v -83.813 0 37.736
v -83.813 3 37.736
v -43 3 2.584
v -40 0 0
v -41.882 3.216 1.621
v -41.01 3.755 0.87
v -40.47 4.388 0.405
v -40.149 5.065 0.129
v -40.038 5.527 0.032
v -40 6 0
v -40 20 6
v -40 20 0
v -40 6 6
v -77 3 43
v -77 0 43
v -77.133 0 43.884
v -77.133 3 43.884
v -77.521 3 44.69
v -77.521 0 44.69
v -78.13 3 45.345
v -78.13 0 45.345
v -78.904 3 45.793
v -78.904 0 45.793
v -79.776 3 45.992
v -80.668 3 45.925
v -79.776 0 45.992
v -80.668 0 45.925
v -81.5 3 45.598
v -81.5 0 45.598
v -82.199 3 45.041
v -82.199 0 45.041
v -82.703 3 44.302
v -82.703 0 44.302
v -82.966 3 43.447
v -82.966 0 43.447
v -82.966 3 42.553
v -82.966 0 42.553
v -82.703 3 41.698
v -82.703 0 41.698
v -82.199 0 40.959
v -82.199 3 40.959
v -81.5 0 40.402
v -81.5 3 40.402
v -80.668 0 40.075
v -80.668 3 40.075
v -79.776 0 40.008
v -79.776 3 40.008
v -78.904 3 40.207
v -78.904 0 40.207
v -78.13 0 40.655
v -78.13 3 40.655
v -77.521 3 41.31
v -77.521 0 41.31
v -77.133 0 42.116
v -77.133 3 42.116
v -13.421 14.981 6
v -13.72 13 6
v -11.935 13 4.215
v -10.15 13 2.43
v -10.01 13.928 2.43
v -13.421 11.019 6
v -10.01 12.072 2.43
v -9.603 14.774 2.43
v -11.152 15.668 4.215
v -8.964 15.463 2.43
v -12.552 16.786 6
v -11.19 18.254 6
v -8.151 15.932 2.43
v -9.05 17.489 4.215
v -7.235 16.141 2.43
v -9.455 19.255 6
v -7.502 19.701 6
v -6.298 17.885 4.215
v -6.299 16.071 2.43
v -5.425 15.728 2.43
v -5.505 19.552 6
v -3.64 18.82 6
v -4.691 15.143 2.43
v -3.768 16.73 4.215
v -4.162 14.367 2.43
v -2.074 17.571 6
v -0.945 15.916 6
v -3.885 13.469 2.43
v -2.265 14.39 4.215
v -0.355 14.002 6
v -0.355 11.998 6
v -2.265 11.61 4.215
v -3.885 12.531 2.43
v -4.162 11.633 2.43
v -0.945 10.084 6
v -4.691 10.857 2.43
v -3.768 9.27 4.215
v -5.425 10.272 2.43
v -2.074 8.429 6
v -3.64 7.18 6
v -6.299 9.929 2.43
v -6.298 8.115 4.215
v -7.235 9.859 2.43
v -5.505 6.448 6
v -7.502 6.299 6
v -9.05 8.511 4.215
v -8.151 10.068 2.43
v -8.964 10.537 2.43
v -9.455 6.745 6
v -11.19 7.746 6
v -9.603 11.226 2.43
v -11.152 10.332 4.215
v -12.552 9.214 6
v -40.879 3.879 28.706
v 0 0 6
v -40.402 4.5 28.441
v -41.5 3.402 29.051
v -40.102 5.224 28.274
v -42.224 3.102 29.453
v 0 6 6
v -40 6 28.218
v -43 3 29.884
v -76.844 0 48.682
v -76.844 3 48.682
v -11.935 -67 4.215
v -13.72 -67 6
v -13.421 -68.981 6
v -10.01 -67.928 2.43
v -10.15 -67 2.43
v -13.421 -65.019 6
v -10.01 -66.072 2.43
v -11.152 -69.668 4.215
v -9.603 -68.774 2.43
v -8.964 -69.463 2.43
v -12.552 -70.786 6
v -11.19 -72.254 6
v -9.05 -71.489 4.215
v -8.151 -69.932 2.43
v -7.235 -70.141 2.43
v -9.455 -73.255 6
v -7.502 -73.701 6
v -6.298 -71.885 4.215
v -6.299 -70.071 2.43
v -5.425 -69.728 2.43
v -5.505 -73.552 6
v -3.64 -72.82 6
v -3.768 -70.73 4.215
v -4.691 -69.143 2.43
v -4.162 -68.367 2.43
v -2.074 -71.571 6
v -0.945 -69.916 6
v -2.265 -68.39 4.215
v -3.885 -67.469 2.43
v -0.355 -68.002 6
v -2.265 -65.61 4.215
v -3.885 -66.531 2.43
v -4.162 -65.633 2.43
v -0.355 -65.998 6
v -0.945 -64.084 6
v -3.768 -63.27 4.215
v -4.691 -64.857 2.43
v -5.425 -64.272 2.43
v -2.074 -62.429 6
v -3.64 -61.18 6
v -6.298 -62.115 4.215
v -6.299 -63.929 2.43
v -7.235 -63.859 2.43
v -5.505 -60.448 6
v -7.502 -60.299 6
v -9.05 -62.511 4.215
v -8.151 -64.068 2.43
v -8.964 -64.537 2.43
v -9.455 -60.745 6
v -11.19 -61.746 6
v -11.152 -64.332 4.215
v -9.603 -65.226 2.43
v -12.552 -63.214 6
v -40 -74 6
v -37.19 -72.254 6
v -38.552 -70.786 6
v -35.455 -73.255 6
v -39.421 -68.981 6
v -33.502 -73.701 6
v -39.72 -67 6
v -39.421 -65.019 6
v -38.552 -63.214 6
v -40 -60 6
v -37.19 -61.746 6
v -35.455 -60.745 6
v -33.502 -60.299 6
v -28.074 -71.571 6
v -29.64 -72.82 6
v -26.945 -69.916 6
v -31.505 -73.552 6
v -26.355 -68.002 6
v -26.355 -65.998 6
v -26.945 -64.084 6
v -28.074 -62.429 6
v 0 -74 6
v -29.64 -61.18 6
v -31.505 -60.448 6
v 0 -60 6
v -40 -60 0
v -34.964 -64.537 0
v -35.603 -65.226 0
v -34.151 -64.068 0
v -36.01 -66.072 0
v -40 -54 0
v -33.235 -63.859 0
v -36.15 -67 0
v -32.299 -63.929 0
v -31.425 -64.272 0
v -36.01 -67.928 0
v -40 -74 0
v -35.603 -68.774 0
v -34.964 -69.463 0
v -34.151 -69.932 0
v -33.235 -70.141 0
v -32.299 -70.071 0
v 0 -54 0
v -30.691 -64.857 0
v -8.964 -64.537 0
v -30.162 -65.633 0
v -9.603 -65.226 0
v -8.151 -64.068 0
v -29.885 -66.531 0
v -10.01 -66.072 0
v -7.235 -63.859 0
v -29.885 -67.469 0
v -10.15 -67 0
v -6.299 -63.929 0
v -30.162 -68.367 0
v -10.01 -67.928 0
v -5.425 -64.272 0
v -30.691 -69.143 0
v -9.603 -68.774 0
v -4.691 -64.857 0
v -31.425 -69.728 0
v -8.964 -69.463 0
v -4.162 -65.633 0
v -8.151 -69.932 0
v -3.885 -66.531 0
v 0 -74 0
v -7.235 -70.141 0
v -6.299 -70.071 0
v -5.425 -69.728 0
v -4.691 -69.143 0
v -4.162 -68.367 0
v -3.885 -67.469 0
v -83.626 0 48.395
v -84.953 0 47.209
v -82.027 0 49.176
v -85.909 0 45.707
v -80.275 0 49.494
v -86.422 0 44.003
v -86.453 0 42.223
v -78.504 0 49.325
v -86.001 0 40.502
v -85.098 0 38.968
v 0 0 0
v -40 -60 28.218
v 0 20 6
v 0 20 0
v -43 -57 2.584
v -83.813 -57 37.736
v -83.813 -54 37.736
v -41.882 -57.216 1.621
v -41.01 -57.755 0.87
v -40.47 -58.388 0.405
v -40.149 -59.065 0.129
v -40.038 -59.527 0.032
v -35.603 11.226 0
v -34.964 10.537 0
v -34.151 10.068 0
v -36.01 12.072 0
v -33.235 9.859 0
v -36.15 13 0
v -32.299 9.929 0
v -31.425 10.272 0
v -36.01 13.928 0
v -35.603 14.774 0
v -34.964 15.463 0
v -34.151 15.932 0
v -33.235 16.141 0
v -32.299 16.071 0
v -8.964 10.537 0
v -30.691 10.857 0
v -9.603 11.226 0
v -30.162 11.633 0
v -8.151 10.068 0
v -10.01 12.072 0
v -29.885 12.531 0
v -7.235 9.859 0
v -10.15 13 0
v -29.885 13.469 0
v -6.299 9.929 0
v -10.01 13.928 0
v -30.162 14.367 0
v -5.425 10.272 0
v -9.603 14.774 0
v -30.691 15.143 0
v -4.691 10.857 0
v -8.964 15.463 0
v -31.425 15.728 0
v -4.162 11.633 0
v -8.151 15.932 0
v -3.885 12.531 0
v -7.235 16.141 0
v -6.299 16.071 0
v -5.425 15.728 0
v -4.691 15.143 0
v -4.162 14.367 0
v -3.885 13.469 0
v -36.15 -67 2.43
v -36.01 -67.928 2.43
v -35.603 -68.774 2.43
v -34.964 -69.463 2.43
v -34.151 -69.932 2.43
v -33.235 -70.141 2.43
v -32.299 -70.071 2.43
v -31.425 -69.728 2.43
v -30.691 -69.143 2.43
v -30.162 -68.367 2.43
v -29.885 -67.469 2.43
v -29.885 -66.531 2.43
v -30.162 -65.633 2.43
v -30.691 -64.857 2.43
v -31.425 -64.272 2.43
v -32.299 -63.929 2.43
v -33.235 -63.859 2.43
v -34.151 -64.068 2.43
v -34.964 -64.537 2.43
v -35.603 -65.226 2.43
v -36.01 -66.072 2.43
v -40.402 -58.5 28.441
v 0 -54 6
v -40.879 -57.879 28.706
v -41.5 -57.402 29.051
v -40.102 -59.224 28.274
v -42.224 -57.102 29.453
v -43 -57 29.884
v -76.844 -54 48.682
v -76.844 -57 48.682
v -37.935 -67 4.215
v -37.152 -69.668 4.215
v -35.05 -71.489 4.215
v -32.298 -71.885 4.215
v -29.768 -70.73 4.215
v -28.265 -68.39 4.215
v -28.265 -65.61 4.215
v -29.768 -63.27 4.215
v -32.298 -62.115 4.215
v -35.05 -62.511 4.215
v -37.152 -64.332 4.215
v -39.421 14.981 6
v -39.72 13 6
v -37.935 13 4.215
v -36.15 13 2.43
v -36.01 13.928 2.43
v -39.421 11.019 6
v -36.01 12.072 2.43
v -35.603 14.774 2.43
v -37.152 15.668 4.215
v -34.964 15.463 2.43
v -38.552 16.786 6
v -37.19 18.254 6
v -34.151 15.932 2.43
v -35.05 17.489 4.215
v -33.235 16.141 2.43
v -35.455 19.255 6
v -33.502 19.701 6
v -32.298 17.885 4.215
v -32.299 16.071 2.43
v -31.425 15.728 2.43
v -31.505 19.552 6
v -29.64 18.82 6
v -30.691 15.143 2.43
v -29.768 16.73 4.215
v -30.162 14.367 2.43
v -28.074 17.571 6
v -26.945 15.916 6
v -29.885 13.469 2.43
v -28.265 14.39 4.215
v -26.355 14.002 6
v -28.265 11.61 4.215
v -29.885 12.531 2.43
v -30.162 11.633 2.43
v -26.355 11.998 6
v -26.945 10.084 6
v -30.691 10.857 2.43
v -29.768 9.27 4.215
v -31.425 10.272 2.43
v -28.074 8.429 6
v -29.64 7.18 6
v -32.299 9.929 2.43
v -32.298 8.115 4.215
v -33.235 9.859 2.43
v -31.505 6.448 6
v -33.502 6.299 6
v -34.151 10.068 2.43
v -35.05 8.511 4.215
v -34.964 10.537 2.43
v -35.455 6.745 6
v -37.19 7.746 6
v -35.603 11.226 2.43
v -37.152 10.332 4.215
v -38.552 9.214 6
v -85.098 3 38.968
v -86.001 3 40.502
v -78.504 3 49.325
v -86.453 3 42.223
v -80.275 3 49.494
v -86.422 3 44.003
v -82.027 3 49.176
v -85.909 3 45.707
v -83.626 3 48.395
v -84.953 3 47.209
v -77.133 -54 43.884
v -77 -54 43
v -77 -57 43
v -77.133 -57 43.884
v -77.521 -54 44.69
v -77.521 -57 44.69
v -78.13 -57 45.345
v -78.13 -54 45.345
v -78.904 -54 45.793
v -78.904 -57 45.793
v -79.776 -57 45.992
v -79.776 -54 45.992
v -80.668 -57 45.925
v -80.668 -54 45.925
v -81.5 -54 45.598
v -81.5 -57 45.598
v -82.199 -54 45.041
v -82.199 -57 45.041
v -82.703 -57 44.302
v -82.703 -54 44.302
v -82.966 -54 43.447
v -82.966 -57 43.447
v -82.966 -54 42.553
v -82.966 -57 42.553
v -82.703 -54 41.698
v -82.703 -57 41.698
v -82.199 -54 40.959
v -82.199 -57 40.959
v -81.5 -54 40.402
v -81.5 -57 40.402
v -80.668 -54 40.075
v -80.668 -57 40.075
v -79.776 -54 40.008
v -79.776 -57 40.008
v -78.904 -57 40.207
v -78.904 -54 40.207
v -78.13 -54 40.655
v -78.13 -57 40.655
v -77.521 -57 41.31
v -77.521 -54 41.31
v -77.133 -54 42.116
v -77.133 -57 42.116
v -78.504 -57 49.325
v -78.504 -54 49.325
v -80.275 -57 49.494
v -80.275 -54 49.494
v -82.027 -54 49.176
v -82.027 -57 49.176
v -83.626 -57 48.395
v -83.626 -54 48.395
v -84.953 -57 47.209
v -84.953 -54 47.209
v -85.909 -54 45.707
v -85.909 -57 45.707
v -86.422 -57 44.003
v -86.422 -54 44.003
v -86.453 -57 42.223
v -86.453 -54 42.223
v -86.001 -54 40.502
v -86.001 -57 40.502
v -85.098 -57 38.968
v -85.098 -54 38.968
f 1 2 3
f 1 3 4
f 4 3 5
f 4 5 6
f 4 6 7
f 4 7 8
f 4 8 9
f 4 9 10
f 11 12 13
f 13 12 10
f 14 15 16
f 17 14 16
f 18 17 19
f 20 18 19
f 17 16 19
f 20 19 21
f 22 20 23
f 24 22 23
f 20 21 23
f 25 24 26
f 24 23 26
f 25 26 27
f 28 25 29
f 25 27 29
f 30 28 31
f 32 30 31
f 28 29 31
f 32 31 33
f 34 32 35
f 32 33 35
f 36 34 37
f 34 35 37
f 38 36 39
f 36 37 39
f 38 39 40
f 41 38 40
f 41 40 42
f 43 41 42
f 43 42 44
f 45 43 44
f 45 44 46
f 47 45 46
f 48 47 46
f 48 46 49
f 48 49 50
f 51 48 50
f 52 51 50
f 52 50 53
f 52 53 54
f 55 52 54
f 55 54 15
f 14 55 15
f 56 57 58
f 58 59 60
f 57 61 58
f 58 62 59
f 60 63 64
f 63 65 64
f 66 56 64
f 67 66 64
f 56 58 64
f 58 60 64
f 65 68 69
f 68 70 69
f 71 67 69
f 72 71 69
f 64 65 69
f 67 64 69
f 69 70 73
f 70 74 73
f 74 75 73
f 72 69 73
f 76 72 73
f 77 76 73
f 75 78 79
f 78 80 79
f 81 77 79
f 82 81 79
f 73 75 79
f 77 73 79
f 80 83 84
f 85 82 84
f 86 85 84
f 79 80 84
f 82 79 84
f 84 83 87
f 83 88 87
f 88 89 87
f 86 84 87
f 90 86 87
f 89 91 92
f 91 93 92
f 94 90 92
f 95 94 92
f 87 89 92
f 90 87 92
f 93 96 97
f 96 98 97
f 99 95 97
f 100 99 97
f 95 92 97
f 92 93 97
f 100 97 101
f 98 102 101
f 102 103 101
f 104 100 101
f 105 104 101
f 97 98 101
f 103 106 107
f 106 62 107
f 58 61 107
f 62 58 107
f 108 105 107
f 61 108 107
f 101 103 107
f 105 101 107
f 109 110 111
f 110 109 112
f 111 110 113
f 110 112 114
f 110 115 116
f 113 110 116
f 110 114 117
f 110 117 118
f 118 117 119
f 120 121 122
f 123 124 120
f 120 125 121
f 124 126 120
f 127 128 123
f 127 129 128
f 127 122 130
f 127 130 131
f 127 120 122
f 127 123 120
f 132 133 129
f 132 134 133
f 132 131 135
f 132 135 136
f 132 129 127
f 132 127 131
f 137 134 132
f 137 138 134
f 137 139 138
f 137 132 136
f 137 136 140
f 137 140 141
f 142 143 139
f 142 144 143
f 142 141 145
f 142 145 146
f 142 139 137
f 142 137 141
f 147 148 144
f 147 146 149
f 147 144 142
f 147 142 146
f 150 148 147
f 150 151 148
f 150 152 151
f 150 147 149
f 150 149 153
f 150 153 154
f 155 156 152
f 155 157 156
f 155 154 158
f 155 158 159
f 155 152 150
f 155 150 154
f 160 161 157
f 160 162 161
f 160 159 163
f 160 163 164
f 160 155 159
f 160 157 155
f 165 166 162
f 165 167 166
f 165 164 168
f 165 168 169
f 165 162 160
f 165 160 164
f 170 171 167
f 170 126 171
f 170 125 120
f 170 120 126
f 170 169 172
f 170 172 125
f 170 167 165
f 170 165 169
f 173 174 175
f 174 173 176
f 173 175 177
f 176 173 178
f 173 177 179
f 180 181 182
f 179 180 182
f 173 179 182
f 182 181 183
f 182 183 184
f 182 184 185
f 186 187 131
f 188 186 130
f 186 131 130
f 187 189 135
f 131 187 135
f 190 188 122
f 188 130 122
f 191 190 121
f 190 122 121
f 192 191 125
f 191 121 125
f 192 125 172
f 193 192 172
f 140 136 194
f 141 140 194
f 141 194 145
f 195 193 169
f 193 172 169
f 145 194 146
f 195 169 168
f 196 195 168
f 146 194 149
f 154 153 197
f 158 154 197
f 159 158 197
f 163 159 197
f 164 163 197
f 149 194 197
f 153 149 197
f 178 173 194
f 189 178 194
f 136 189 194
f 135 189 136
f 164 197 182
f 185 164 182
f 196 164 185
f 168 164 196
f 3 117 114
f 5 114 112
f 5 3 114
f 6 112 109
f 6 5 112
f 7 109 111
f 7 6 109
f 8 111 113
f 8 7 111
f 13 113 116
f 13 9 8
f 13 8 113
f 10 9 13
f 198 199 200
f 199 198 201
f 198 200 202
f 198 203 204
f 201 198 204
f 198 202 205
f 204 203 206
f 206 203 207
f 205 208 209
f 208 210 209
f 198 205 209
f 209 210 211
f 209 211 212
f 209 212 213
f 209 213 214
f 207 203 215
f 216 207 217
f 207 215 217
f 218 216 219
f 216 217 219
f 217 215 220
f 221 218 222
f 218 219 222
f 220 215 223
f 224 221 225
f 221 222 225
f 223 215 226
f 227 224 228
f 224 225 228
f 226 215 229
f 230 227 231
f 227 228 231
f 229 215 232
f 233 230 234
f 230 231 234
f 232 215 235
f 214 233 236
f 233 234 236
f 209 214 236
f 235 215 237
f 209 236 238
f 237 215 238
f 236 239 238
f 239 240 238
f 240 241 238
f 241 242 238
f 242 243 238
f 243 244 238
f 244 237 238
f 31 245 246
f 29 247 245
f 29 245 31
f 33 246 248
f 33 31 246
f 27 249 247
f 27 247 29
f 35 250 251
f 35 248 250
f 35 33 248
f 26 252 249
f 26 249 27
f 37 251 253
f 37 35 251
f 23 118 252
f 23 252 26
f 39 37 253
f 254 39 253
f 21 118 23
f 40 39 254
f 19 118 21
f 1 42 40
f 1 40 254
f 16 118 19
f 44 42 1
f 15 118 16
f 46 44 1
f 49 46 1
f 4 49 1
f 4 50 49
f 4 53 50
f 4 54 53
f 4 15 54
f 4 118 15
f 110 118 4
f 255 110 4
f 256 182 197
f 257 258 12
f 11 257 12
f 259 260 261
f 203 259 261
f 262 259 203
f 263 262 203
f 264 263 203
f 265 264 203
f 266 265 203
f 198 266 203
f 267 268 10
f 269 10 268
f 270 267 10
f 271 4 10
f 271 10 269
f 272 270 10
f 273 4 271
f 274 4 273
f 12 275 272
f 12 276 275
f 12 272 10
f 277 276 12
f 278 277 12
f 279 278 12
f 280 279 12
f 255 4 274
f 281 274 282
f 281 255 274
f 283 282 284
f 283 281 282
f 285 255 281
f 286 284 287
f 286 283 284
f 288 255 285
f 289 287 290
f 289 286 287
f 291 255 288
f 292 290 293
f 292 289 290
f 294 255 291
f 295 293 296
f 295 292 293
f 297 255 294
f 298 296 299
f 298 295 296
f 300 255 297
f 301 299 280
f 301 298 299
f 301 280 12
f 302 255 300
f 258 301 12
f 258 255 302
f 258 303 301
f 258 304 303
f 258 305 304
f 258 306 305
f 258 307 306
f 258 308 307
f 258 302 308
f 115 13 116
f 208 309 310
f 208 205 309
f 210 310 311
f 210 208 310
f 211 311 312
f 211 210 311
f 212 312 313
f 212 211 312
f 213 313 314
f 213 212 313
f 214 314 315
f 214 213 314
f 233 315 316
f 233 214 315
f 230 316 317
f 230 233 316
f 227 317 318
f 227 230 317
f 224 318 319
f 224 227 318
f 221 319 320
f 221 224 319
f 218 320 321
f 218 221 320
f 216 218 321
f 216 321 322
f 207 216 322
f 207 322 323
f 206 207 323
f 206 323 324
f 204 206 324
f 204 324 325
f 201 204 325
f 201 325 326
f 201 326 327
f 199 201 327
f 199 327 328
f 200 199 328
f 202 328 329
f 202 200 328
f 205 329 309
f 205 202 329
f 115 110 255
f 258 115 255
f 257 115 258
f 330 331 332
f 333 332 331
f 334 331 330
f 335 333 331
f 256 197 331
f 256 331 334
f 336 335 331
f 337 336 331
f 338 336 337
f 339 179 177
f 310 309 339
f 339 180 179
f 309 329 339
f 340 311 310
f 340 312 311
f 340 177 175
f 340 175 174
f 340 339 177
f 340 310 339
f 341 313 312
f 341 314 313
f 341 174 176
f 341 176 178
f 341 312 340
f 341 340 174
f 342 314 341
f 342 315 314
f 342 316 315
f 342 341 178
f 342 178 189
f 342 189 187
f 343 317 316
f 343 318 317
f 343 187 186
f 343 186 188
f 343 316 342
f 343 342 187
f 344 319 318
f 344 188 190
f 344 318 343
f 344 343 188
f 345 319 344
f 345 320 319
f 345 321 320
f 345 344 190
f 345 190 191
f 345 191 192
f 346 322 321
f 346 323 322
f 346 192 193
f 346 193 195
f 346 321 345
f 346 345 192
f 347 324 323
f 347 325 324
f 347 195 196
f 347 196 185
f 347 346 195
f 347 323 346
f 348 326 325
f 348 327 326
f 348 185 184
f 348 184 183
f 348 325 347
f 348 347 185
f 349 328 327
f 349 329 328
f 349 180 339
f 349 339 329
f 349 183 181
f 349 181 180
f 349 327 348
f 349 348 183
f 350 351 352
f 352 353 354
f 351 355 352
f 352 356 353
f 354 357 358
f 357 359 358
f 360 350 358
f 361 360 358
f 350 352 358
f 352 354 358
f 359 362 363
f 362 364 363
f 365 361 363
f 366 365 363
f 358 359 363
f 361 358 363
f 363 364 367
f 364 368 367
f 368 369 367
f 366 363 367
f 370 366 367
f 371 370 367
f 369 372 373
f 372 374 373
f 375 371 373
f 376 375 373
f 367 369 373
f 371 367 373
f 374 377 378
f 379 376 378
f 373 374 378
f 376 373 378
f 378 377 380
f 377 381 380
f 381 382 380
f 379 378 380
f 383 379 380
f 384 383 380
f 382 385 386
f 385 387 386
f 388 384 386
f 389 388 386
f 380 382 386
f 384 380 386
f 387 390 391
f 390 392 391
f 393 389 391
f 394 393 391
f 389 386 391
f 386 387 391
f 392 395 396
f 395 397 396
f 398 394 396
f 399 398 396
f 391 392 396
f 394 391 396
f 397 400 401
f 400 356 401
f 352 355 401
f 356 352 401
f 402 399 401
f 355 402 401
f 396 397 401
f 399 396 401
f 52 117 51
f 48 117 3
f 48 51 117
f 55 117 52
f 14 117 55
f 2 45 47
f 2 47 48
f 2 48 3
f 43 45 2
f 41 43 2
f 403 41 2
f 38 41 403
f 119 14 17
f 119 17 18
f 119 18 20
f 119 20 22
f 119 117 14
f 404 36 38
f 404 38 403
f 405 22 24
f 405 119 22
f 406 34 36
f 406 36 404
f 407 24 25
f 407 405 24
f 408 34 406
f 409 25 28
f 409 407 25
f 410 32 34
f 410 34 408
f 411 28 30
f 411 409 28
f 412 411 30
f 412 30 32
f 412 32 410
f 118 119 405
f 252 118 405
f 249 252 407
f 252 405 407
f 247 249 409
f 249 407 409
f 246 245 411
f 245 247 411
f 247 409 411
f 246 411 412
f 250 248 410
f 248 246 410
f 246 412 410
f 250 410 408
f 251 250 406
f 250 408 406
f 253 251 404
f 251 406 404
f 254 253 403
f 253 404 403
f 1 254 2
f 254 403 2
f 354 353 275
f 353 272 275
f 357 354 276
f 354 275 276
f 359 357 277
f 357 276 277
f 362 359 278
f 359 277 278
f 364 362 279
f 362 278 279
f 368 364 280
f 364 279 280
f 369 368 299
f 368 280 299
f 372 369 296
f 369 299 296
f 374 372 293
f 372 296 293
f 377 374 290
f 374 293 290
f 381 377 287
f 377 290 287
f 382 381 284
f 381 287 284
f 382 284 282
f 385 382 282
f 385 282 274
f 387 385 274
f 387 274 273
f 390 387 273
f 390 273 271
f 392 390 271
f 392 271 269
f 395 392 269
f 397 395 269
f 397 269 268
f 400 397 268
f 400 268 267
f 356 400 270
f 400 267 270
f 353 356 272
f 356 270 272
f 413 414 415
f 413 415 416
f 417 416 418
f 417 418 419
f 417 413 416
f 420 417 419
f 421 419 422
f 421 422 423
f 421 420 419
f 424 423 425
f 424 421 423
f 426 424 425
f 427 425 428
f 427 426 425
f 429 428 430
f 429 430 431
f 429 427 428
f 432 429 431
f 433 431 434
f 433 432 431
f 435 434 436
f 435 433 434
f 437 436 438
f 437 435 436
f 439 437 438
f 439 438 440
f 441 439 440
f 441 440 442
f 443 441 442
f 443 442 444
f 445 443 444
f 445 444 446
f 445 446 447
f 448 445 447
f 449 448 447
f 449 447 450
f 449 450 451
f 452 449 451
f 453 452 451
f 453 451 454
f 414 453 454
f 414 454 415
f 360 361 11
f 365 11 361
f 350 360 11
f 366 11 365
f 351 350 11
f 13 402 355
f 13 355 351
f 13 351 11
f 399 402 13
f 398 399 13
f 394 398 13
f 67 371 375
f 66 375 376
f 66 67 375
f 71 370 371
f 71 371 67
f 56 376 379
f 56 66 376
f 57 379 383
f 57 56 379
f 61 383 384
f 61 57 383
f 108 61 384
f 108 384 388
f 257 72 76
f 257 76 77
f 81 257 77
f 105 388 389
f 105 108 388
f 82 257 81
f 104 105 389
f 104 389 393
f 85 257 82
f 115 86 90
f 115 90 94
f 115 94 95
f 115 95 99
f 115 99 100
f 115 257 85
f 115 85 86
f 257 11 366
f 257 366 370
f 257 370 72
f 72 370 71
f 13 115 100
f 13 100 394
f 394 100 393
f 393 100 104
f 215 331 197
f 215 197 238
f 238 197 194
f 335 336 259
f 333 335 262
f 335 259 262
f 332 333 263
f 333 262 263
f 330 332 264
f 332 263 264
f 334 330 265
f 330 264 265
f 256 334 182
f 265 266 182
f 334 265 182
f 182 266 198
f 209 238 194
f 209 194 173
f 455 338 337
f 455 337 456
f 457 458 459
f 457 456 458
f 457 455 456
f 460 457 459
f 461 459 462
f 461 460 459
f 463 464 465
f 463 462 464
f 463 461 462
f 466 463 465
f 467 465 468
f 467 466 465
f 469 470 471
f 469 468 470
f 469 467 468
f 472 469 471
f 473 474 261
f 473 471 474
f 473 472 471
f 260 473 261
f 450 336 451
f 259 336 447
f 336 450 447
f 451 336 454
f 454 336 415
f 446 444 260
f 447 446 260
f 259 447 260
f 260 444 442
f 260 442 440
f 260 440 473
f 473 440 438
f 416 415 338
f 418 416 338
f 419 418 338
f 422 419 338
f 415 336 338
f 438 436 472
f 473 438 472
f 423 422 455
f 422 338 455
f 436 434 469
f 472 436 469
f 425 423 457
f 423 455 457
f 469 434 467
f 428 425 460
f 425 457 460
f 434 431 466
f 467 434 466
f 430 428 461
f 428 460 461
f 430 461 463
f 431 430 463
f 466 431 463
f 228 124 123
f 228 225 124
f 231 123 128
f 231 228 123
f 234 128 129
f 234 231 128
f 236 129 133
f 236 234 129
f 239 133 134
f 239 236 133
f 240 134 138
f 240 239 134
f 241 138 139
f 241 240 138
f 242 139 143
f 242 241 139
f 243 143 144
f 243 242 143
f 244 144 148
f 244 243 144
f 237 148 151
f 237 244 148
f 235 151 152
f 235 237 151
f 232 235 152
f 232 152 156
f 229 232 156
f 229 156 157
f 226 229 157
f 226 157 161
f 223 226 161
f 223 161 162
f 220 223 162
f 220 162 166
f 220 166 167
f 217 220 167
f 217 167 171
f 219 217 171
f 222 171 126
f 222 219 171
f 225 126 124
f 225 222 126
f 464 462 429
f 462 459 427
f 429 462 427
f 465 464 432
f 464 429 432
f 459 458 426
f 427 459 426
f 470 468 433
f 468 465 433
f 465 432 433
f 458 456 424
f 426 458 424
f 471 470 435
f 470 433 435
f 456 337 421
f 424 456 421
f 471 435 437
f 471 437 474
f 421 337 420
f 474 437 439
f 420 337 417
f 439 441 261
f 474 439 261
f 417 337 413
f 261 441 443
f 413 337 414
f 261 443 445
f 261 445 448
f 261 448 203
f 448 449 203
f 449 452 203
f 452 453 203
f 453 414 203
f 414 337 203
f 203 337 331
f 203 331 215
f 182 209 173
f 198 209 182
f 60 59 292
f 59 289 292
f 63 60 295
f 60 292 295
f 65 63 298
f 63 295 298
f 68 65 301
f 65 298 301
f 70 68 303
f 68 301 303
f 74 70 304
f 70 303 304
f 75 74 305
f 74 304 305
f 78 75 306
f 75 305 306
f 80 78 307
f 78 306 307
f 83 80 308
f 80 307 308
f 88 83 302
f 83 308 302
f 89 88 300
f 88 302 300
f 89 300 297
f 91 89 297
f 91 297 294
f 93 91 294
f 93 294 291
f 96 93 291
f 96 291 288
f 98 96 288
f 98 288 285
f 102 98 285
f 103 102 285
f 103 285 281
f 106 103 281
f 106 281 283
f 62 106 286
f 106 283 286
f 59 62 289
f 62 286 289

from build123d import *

# Parameters (mm, degrees)
F1_DEPTH        = 100
F3_R            = 3
F4_DEPTH        = 25
F6_DEPTH        = 6
F8_DEPTH        = 25
F10_DEPTH       = 3
F11_R           = 3
F12_D           = 6.3
F12_CSINK_D     = 13.44
F12_CSINK_ANGLE = 90


with BuildPart() as f1:
    # F0 (on Right) → F1 (new body)
    with BuildSketch(Plane.YZ):
        Polygon((0, 50), (0, 0), (50, 0), (50, 6), (6, 6), (6, 50), align=None)
    extrude(amount=-F1_DEPTH)

    # F3 (on face) → F4 (cut)
    with BuildSketch(Plane.XZ):
        with Locations((-80, 43)):
            Circle(F3_R)
    extrude(amount=-F4_DEPTH, mode=Mode.SUBTRACT)

    # F5 (on face) → F6 (cut)
    with BuildSketch(Plane(origin=(0, 0, 0), x_dir=(1, 0, 0), z_dir=(0, 0, -1))):
        Polygon((-40, -20), (-40, -6), (-100, -6), (-100, -50), (0, -50), (0, -20), align=None)
    extrude(amount=-F6_DEPTH, mode=Mode.SUBTRACT)

    # F7 (on face) → F8 (cut)
    with BuildSketch(Plane(origin=(0, 6, 0), x_dir=(-1, 0, 0), z_dir=(0, 1, 0))):
        with BuildLine():
            ThreePointArc((76.8438132159, 48.6822957494), (85.4830416797, 46.4908815418), (83.8130402948, 37.735902384))
            Line((83.8130402948, 37.735902384), (40, 0))
            Line((40, 0), (100, 0))
            Line((100, 0), (100, 50))
            Line((100, 50), (0, 50))
            Line((0, 50), (0, 6))
            Line((0, 6), (76.8438132159, 48.6822957494))
        make_face()
    extrude(amount=-F8_DEPTH, mode=Mode.SUBTRACT)

    # F9 (on face) → F10 (cut)
    with BuildSketch(Plane(origin=(0, 6, 0), x_dir=(-1, 0, 0), z_dir=(0, 1, 0))):
        Polygon((40, 28.2176875213), (40, 0), (106.4058691263, 23.9036325365), (83.2354798913, 63.7919008732), align=None)
    extrude(amount=-F10_DEPTH, mode=Mode.SUBTRACT)

    # F11
    f11_edges = [f1.edges().sort_by_distance(p)[0] for p in [
        (-40, 3, 14.108844),
    ]]
    fillet(f11_edges, radius=F11_R)

    # F12 (through all)
    with Locations(Plane.XY.offset(6)):
        with Locations((-7, 13), (-33, 13)):
            CounterSinkHole(F12_D / 2, F12_CSINK_D / 2, counter_sink_angle=F12_CSINK_ANGLE)


with BuildPart() as f14_1:
    # F14: instance of F1
    add(f1.part.mirror(Plane(origin=(-44.4244543303, -27, 20.0282334001), x_dir=(1, 0, 0), z_dir=(0, -1, 0))))


solid = Compound([f1.part, f14_1.part])
